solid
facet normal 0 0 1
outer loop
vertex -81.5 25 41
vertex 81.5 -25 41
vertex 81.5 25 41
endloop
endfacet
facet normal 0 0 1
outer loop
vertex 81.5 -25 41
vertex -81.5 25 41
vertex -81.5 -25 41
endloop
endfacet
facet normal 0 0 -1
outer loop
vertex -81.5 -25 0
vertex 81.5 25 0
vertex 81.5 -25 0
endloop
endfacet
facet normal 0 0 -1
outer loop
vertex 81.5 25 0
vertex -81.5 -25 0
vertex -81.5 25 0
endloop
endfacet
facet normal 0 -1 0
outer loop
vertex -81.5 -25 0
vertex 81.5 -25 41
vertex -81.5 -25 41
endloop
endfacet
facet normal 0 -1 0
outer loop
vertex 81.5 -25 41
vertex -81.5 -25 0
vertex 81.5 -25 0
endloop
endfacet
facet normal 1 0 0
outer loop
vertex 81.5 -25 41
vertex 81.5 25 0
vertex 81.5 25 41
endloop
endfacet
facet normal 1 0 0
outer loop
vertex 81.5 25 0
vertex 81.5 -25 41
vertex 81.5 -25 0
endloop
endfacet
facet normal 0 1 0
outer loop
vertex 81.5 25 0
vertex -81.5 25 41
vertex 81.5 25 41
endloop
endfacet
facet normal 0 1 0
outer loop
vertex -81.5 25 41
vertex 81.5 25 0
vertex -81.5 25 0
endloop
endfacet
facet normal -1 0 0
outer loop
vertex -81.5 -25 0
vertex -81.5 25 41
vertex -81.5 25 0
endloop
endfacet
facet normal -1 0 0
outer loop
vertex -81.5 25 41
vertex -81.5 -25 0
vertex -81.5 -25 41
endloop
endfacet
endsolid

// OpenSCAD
module battery()
{
 //Turnigy hard case pack 76WH 5000mah battery    
 translate([-81.5,-25,0]) 
  {  
   cube([163, 50, 41]); 
  } 
 }
 
 
 battery();
